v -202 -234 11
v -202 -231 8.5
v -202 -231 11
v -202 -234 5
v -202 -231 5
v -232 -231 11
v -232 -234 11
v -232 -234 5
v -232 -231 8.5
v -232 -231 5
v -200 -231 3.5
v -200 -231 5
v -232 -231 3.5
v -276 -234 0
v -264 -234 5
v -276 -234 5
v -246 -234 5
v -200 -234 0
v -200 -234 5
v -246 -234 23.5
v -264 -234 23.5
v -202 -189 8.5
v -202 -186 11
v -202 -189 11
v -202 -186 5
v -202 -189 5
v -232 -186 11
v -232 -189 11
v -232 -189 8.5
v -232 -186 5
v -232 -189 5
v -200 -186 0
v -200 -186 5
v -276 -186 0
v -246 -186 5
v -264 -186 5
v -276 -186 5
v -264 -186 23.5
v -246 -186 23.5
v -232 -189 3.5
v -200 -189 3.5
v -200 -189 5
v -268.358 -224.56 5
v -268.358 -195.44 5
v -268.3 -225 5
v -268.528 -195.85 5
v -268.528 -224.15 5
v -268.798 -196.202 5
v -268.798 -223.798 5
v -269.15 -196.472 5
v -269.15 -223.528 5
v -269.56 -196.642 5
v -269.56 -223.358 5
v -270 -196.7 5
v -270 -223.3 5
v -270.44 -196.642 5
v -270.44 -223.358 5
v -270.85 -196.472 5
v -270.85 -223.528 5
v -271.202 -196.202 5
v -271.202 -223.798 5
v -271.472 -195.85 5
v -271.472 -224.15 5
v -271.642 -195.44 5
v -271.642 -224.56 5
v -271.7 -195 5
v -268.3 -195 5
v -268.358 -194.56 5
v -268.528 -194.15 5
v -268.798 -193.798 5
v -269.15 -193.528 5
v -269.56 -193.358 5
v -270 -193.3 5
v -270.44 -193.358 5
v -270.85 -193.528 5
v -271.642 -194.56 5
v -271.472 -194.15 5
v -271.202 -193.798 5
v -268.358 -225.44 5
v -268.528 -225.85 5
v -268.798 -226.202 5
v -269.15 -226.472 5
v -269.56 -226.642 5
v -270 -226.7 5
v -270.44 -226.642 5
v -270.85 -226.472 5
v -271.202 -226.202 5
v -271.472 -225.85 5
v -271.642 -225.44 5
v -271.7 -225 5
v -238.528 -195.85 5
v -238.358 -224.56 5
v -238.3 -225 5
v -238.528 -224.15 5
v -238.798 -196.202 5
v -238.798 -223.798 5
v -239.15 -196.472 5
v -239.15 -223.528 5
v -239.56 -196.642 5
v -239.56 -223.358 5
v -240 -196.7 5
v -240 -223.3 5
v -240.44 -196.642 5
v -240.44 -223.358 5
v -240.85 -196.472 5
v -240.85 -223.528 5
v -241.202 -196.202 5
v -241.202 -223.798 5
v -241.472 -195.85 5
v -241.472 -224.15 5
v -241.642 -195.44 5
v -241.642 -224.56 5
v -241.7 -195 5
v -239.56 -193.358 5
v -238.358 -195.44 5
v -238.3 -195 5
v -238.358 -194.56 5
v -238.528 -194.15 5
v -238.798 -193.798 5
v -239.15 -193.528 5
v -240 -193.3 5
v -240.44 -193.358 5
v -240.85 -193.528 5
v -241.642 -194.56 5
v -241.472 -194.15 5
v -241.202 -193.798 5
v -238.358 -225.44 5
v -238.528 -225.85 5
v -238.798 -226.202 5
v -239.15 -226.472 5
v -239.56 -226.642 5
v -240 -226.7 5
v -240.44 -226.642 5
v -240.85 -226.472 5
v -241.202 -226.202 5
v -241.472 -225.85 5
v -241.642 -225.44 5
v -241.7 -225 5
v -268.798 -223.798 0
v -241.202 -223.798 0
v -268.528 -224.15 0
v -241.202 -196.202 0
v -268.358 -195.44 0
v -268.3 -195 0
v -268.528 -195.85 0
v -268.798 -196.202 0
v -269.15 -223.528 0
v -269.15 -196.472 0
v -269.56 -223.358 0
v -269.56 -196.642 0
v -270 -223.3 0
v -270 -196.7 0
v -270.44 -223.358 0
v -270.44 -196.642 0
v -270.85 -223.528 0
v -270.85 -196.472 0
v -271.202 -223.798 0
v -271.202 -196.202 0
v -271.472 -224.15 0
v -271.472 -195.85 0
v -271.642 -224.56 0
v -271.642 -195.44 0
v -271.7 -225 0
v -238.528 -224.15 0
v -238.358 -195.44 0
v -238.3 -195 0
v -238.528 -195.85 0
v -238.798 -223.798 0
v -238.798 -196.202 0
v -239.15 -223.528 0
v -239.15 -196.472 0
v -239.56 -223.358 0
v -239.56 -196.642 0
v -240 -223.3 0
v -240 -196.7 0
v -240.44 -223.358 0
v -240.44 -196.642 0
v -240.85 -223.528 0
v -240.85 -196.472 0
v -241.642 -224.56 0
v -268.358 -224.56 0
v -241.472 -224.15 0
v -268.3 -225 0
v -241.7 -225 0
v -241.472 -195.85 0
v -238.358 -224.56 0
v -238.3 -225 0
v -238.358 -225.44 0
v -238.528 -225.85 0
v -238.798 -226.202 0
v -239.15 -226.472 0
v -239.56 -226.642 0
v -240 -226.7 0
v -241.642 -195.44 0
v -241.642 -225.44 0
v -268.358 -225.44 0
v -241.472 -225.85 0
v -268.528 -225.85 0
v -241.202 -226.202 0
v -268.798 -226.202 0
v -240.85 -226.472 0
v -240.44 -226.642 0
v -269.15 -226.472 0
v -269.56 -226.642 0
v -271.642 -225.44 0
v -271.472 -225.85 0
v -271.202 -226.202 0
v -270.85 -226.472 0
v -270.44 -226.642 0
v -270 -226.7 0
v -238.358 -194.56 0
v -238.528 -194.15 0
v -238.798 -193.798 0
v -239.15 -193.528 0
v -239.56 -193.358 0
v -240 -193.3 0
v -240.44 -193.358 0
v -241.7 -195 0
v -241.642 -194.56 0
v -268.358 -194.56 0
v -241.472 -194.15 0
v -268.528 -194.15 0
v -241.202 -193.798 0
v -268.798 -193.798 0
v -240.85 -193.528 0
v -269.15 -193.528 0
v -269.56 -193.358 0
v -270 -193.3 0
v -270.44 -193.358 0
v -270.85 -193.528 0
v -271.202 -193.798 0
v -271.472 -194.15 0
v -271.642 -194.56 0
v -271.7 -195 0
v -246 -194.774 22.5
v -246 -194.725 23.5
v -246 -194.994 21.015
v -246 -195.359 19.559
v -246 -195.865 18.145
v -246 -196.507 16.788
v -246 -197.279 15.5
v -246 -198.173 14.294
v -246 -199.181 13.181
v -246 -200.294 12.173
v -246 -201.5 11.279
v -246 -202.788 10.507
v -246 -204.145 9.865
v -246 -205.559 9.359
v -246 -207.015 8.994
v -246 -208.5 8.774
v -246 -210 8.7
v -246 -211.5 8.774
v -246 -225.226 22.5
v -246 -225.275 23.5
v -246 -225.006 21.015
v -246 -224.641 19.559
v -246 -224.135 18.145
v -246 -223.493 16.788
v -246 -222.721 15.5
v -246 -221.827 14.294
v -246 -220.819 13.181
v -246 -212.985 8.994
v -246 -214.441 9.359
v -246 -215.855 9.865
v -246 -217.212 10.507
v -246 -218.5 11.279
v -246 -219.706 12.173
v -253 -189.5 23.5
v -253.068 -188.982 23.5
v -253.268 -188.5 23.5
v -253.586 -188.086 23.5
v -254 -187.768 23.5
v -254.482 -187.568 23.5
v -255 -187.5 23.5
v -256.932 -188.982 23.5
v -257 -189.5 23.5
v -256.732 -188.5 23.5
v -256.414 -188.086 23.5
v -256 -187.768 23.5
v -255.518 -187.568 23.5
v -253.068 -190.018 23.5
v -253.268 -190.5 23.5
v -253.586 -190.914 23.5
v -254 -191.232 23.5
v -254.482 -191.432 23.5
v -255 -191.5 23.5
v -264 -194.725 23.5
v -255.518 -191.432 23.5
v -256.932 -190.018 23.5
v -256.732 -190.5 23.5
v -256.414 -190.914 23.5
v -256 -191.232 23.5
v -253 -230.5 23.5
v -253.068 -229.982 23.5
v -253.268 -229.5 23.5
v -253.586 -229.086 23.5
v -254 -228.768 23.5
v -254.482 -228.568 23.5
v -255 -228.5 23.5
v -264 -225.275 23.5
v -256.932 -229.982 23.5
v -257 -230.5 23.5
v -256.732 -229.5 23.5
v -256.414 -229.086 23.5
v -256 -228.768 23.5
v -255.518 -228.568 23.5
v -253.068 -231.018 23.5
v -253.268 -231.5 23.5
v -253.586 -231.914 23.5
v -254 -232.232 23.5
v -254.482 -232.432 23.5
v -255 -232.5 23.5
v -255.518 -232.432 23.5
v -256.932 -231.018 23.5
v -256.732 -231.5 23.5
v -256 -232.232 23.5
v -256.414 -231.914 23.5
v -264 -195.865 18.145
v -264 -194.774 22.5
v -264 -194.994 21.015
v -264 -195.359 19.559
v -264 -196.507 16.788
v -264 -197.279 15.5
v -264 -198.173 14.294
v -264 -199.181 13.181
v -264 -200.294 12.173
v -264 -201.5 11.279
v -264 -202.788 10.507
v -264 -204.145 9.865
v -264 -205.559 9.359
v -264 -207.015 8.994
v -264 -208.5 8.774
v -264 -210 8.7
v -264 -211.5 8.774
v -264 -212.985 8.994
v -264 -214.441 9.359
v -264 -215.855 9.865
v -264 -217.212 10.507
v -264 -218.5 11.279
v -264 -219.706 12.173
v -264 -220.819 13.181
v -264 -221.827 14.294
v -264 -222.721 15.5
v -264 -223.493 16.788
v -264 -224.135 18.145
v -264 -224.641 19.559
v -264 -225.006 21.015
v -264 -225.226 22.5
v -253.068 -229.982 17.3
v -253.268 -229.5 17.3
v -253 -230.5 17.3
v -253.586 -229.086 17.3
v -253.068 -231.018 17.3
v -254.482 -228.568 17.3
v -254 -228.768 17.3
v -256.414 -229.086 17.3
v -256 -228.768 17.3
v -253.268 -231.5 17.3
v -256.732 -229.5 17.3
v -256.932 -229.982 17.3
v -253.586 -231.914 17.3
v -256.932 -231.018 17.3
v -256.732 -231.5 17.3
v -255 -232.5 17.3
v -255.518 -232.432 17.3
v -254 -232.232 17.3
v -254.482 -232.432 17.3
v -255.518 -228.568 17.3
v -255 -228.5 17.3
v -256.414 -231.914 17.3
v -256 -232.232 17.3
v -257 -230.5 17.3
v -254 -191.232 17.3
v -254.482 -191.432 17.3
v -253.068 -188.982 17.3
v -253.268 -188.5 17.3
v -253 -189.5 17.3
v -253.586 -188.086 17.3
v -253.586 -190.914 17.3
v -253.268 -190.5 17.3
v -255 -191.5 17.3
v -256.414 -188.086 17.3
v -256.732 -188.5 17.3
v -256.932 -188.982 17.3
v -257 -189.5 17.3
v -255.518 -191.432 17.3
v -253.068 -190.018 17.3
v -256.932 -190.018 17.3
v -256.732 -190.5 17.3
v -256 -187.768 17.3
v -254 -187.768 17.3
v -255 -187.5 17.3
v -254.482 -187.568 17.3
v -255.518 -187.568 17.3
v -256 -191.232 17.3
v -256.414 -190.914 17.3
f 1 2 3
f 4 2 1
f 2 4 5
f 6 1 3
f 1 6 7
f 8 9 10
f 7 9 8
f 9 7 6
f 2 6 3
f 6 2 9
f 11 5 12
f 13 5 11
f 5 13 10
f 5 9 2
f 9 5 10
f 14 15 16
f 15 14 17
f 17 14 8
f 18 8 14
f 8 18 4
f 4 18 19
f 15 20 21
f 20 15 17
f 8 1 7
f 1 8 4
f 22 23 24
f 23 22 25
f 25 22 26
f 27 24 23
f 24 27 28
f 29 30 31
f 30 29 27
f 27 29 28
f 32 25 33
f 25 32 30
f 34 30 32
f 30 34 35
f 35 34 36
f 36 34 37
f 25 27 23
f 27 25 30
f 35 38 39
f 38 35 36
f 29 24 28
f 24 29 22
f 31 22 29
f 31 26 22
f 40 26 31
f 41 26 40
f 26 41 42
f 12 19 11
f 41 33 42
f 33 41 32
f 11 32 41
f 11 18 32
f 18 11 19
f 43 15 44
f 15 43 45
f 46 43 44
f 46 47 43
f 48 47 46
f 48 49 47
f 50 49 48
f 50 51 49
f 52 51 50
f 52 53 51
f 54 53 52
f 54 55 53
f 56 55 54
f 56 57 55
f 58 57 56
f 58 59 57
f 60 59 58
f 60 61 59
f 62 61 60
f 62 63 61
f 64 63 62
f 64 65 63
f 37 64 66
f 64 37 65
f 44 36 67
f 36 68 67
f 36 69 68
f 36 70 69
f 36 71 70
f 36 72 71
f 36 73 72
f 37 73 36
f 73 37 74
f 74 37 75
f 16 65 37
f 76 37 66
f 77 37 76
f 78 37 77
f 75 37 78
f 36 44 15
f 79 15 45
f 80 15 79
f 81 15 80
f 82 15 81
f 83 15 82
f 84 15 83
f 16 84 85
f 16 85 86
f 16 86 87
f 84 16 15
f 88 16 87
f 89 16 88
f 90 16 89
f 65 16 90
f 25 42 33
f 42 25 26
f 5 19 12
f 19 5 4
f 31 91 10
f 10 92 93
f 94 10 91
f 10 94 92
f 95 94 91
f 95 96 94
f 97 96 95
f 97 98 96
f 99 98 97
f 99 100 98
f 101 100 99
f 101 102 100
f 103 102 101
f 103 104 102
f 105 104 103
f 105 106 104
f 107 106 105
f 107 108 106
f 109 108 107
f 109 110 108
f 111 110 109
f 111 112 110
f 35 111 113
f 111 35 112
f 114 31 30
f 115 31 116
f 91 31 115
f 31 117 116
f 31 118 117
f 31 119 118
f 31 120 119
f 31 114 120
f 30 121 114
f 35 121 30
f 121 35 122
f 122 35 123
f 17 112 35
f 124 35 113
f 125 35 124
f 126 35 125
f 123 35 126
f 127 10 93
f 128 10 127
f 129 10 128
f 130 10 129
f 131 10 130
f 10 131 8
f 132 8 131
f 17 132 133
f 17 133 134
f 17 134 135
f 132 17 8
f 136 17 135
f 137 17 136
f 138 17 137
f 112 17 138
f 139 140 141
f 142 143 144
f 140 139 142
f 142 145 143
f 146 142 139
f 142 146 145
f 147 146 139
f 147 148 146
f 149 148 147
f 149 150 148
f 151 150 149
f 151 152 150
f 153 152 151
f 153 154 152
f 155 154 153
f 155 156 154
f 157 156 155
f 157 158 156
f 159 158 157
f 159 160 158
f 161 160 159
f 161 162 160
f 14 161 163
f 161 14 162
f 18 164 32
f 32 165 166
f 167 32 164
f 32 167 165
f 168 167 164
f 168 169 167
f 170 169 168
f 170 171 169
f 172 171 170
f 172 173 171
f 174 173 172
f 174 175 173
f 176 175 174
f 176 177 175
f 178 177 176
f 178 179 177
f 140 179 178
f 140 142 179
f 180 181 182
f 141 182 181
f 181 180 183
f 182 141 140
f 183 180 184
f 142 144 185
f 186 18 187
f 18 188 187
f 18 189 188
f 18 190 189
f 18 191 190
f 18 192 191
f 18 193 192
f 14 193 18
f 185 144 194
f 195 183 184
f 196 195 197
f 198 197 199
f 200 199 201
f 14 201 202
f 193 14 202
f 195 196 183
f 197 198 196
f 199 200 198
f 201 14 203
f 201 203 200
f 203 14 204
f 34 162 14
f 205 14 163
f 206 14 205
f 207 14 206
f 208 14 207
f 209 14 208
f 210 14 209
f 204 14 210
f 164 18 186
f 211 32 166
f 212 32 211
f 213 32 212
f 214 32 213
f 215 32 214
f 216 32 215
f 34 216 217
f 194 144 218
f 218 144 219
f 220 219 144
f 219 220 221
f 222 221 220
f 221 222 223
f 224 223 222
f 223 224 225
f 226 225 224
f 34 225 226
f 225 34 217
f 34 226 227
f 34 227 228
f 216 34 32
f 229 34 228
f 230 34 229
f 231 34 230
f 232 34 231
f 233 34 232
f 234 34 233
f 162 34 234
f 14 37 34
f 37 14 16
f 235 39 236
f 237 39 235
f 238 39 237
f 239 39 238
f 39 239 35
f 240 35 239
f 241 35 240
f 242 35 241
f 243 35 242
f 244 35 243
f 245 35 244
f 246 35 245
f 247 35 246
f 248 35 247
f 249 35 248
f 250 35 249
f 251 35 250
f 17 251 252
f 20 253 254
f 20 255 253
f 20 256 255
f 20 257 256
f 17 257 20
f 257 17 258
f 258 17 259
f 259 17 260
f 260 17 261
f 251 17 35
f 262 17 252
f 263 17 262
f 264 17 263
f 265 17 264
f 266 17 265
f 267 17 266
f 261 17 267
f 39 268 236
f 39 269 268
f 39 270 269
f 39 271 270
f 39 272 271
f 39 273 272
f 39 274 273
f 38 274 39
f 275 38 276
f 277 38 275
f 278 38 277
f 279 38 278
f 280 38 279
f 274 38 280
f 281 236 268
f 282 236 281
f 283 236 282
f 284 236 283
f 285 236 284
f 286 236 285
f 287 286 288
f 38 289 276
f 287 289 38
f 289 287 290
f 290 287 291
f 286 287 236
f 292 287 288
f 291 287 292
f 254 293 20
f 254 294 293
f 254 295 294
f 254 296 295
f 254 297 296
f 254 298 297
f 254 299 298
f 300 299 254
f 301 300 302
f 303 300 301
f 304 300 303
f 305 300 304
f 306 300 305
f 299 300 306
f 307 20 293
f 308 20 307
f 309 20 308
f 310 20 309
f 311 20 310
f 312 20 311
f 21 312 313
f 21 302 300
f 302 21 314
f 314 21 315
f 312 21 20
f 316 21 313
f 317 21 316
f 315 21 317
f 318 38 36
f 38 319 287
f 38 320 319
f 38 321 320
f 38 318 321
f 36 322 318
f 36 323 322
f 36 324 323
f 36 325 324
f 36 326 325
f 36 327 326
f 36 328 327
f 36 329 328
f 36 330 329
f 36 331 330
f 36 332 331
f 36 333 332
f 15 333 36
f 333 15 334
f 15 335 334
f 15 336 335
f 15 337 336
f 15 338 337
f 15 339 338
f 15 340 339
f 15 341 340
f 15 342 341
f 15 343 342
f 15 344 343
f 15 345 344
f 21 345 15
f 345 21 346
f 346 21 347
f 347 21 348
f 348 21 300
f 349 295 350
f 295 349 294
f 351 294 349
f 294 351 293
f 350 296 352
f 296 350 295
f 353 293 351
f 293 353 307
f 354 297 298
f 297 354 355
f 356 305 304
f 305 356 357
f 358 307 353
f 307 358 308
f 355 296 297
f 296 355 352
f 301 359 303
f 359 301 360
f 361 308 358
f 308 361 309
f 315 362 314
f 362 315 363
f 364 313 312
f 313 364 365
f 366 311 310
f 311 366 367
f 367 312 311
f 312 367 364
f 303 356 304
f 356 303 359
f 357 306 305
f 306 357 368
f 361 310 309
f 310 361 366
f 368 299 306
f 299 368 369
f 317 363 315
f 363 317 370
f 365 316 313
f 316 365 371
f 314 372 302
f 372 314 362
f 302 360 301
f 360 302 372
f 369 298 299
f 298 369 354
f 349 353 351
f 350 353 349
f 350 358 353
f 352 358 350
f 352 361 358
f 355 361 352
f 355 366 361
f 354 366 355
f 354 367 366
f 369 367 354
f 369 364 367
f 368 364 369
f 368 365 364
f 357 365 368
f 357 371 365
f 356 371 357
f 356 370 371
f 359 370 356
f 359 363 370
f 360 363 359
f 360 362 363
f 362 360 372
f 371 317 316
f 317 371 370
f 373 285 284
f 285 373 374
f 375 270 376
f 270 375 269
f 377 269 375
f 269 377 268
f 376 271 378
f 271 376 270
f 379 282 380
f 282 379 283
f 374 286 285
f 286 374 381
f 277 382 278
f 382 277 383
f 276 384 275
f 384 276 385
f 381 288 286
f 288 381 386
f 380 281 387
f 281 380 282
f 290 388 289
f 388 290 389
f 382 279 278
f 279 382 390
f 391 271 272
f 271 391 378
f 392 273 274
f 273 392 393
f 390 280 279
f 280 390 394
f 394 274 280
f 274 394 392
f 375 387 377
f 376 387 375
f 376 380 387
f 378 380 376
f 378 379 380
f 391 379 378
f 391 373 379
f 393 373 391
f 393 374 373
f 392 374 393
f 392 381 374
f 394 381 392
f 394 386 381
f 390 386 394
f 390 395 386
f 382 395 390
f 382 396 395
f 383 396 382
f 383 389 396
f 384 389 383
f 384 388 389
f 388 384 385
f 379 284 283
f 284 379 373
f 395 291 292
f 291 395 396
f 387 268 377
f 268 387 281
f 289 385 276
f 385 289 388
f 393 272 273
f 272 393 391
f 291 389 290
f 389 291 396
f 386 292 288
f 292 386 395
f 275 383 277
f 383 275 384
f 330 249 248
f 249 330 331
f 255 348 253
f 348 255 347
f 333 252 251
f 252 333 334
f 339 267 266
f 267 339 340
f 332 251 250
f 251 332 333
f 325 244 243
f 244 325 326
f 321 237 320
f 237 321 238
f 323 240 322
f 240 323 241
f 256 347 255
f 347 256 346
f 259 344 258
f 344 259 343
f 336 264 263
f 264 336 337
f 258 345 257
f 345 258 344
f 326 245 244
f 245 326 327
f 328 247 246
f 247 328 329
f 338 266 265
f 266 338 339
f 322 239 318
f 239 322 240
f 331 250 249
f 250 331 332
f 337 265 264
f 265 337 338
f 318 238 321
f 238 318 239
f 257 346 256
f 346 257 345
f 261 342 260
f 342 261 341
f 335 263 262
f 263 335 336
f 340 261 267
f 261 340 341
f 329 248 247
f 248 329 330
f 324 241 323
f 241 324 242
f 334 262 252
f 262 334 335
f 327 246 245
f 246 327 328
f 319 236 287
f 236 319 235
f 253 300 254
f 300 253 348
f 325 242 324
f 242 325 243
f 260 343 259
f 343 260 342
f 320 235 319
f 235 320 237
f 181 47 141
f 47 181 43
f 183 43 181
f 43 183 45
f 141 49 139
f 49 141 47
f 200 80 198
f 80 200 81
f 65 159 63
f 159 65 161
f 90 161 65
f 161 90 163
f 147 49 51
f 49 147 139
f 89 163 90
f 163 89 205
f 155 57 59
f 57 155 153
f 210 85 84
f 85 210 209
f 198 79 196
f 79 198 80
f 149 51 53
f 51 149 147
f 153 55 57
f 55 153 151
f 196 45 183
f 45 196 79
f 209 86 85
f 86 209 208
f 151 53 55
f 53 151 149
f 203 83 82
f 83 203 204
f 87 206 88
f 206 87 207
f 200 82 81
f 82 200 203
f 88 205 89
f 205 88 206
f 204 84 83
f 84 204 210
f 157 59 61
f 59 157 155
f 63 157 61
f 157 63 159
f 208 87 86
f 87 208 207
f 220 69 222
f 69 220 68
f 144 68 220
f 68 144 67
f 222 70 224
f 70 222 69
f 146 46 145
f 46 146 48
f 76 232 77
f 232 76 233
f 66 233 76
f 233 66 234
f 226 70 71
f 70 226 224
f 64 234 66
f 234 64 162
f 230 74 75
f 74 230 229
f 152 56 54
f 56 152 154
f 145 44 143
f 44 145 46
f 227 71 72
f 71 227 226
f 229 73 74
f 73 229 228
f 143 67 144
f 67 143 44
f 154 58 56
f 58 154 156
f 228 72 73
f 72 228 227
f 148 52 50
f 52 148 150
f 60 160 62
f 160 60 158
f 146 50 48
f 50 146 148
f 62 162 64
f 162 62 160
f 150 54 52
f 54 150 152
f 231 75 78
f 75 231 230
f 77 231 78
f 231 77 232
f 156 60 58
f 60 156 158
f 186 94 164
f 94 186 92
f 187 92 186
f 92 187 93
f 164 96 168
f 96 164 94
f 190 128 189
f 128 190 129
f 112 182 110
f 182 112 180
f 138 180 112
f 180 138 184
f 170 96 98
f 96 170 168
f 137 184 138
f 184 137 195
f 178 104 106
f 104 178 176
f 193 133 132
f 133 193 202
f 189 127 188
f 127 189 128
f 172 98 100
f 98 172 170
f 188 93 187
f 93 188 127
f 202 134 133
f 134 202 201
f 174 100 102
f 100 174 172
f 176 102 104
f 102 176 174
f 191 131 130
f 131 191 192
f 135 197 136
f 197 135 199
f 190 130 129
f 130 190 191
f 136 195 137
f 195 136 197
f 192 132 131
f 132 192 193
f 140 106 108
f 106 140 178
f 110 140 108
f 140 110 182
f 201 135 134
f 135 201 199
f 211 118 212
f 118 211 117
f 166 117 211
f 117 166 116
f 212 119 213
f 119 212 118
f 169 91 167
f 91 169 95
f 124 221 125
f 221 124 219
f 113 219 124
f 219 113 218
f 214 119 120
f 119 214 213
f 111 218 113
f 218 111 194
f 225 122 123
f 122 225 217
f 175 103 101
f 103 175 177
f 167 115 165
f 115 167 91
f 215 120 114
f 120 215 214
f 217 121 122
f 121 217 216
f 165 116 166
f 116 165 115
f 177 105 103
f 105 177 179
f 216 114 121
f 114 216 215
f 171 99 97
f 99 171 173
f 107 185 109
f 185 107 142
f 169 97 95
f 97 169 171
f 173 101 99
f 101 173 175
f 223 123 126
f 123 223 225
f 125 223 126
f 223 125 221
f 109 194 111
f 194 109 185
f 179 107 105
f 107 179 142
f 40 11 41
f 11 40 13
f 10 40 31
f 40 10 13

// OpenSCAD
// file: machine_frame.scad
// =============================================
// Riftbound Card Sorter — shared machine frame
// =============================================
// Single source of truth for the card path after the Nov 11 redesign
// (suction pick from a motor-raised hopper, raised transport line,
// cradle shuttle sorter). Machine coords as in assembly.scad:
//   X = card travel (hopper -> belt -> tray), Y = across belt (+Y = back,
//   electronics side), Z = up, Z=0 bottom of baseplate tiles.
// `use <machine_frame.scad>` does not import variables, so read these via
// the functions at the bottom.
// =============================================

base_top   = 4;      // top of baseplate tiles
riser_h    = 60;     // conveyor deck raised so cards can FALL into both tray floors
deck_z     = base_top + riser_h;          // rail base / hopper deck reference = 64

// Conveyor (geometry unchanged, just lifted by riser_h)
belt_x0    = -165;   // belt start
belt_x1    = 85;     // belt end
roller_x   = [-140, 60];
rail_in    = 45;     // |Y| of rail inner faces
shaft_z    = deck_z + 15;
card_z     = deck_z + 15 + 11.9;          // top of round belts = card face = 90.9
scan_flat  = [-127, 47];                  // slide-bed backed flat zone (X)

// Scanner
cam_x      = 5;      // lens axis; card centred here for capture (moved from -40 so the hood clears the arm drop zone at X -139..-51)

// Hopper (motor-raised floor keeps top card at card_z)
hopper_x   = -215;   // cavity centre X (Y = 0)

// Baseplate extents (3x3 tiles of 190x180)
base_x     = [-285, 285];
base_y     = [-270, 270];

// Pick & place hand-off
drop_x     = -95;    // card CENTRE when the suction arm releases it onto the belt
                     // (card spans -139..-51: on belts, clear of hopper wall)
drop_clear = 3;      // card underside this far above belt at release (low drop)

// Sorting tray (bottom on baseplate); owner of tray placement may move it in X
tray_floor_lower_z = base_top + 2.5;      // lower slot floor
tray_floor_upper_z = base_top + 65 + 3 + 2.5;  // = 74.5 upper slot floor

// Card
card_w = 63; card_l = 88; card_t = 0.33;  // RAW cards (owner confirmed 2026-11-11: no sleeves), ~1.75 g

function frame_base_top()  = base_top;
function frame_riser_h()   = riser_h;
function frame_deck_z()    = deck_z;
function frame_belt_x0()   = belt_x0;
function frame_belt_x1()   = belt_x1;
function frame_roller_x()  = roller_x;
function frame_rail_in()   = rail_in;
function frame_card_z()    = card_z;
function frame_scan_flat() = scan_flat;
function frame_cam_x()     = cam_x;
function frame_hopper_x()  = hopper_x;
function frame_base_x()    = base_x;
function frame_base_y()    = base_y;
function frame_drop_x()    = drop_x;
function frame_drop_clear()= drop_clear;
function frame_tray_floor_lower_z() = tray_floor_lower_z;
function frame_tray_floor_upper_z() = tray_floor_upper_z;
// main file
// =============================================
// Riftbound Card Sorter — Vacuum pump bracket (R385 12 V diaphragm pump)
// =============================================
// Holds the R385 pump (vacuum source for the pick-arm cup) on the baseplate,
// front-left, with a TPU sleeve between the motor can and the printed clamp so
// the diaphragm buzz does not reach the baseplate / pick arm.
//
// PUMP (typical R385 / "385" aquarium diaphragm pump, e.g. Gikfun; measure yours):
//   motor RS-385 can Ø27.6 × 38 (rear boss + solder tabs ≈ 4 more),
//   pump head ≈ 40 wide × 36 tall × 32 long on the shaft end, two Ø8.5 nozzles
//   ≈ 15 long on the head end face. Overall ≈ 90 × 40 × 36.
//   Axis along machine X, head/nozzles toward +X (toward the arm tower,
//   where the 4 mm vacuum tube goes up the column).
//
// PLACEMENT (machine coords, bolts on 4 real baseplate grid holes):
//   axis Y −210, Z 28; can X −268..−230, head X −230..−198, nozzles to X ≈ −183.
//   Bracket X −276..−200, Y −234..−186, Z 4..47 (saddle + cap at X −264..−246,
//   head cradle at X −232..−200).
//   Grid holes (tile 0,0: X −270..−120, Y −255..−105 every 30): (−270, −225), (−270, −195),
//   (−240, −225), (−240, −195): 4 × M3 × 20 SHCS + washer + nut
//   (base 5 + tile 4 + 6 mm board = 15 clamp, + 4 → 19 → M3 × 20).
//   Clear of: arm-tower foot (X −188..−112, Y −173..−122: ≥ 13 mm in Y),
//   hopper (Y ≥ −65.6), riser (X ≥ −165), the arm sweep (all ≥ Y −152 and
//   Z ≥ 60 at this X) and the shuttle (X ≥ 92).
//
// ASSEMBLY ORDER — BASE BEFORE PUMP: the grid fixes the X −240 bolts at
//   Y −210 ± 15, and the can (r 13.8) leaves only 1.2 mm outside its outline: a
//   2.5 mm hex key (r 1.25) on those bolts is 0.05 mm inside the can's plan
//   outline, so they cannot be driven with the pump in place. Bolt the base
//   to the board first (all 4), then lay the pad, sleeve + pump and the cap.
//   To remove the base later, take the cap and pump off first.
//
// HEAD CRADLE: the head (≈ 32 long, ≈ 60 g with the diaphragm) used to
//   cantilever 50 mm from the 18 mm clamp. The base now runs on under the head
//   as a shallow cradle: a pocket (floor Z 7.5) holding a 1.5 mm TPU pad
//   (part="pad", or cut from the same neoprene strip) that the head bottom
//   (Z 9) rests on, and two 6 mm cheeks 1 mm off the head sides that stop it
//   rocking in Y. The pad keeps the head isolated like the can sleeve. Real
//   R385 heads vary: if the pad does not touch, shim it; it must not lift the
//   can off the saddle.
//
// VENT VALVE (part="valve_clip", a separate small bracket on 2 grid holes):
//   uxcell 2-way NORMALLY CLOSED mini air solenoid valve, DC 12 V 0.2 A (2.2 W),
//   0–350 mmHg, Ø3 mm barbs, 15 × 14 × 34 mm overall incl. the axial barb,
//   11 cm leads out of the coil end (listing: walmart.com/ip/809112545, the
//   common "0520-size" mini valve body). Measure yours: the
//   model below (coil 15 × 14 × 22, head Ø10 × 6, axial barb Ø3 × 6, side vent
//   barb Ø3 × 5) is a reference envelope, not a vendor drawing.
//   It lies along Y with the axial (line) barb toward +Y and the side barb up
//   (open to air = the vent). Clip on grid holes (−180, −255), (−150, −255):
//   2 × M3 × 20 SHCS + washer + nut (plate 5 + tile 4 + board 6 = 15, as the
//   base). The valve snaps down between two lipped walls onto a strip of 1 mm
//   foam tape (floor Z 19.5, valve axis Z 28 = the vacuum line height).
//   TEE: a 1/8" (3.2 mm) barbed plastic tee (≈ 22 × 11, Ø3 barbs) hangs in
//   the tube at X −165, Y −210, Z 28, 18 mm past the pump nozzle; its branch
//   (−Y) goes to the valve's axial barb with a 20 mm piece of 2 × 4 silicone
//   (PU 4 × 2.5 is a tight push onto a Ø3 barb: warm it). Valve clip X −186..−144,
//   Y −264..−246, Z 4..37.7; clear of the arm tower foot (Y ≥ −173: 73 mm), the
//   arm sweep (Y ≥ −152), the hopper (Y ≥ −65.6) and the pump base (X ≤ −200).
//
// ISOLATION: a TPU 95A sleeve (part="sleeve") on the can; the clamp halves
//   close a 1.0 mm gap onto it (≈ 0.5 mm radial squeeze of the 1.7 mm wall),
//   so the preload is set by geometry, not by screw torque. The sleeve's end
//   flanges keep it (and the pump) from walking axially. No TPU? Wrap the can
//   in 1.5 mm neoprene / EPDM strip, 18 mm wide, instead.
//
// PARTS (`part`, print orientation):
//   base        base flange + lower saddle + head cradle (2 × M3 inserts)  upright, no supports
//   cap         clamp strap                                    on its end face, no supports
//   sleeve      TPU isolation sleeve                           upright, no supports
//   pad         TPU head pad 30 × 40 × 1.5                     flat, no supports
//   valve_clip  vent-valve clip                                upright, no supports (lips 45°)
// HARDWARE: 4 × M3 × 20 SHCS + washer + nut (base → baseplate),
//   2 × M3 × 10 SHCS + 2 × M3 heat-set inserts (Ø4.0 × 5.7) (cap → base),
//   2 × M3 × 20 SHCS + washer + nut (valve clip → baseplate),
//   1 × 12 V NC mini solenoid valve, 1 × 1/8" barbed tee, 20 mm 2 × 4 silicone tube,
//   1 mm foam tape 14 × 16 (valve seat).
// =============================================

use <machine_frame.scad>

/* [Export] */
part = "base";        // base | cap | sleeve | assembly

$fn = 64;
bt = frame_base_top();                 // 4

// ── Pump ────────────────────────────────────────────────────────────────────
can_d   = 27.6;   can_l  = 38;
head_w  = 40;     head_h = 36;  head_l = 32;   head_dz = -1;   // head centre below the axis
noz_d   = 8.5;    noz_l  = 15;  noz_dy = 9;
pump_y  = -210;   pump_z = bt + 24;            // axis: Y −210, Z 28
can_x0  = -268;                                 // motor rear (can end)

// ── Sleeve / clamp ──────────────────────────────────────────────────────────
slv_id  = 27.2;  slv_t = 1.7;  slv_od = slv_id + 2 * slv_t;   // 30.6
slv_fl  = 2;     slv_fl_od = slv_od + 4;                       // end flanges
sad_w   = 18;                         // saddle / cap width along X
sad_x0  = -264;                       // saddle X −264..−246 (washers at −266.5 / −243.5 clear)
gap     = 1.0;                        // clamp gap (closes on the sleeve)
r_in    = slv_od / 2;                 // cradle radius 15.3
cap_r   = r_in + 2.5;                 // cap ring outer radius 17.8
ear_y   = 20.5;                       // cap screws / inserts at Y = axis ± 20.5
sad_hy  = 24;                         // saddle half-width (Y)
ear_t   = 5;                          // cap ear thickness
ins_d   = 4.0;  ins_l = 5.7;

// ── Base flange ─────────────────────────────────────────────────────────────
base_t  = 5;
base_x  = [-276, -200];  base_y = [-234, -186];
// ── Head cradle (under the pump head, X −230..−198) ─────────────────────────
pad_t   = 1.5;                        // TPU / neoprene pad
crd_x   = [-232, -200];               // cradle pocket + cheeks along X
crd_gap = 1.0;                        // cheek ↔ head side
crd_h   = 6;                          // cheek height above the flange top
head_z0 = pump_z + head_dz - head_h / 2;          // 9: head underside
// baseplate grid: 3 × 3 tiles of 190 × 180 from X −285, Y −270, holes every
// 30 mm starting 15 mm in from each tile edge (X restarts per tile column)
function on_grid1(v, x0, tile, n) =
    let(t = floor((v - x0) / tile), r = (v - x0) - t * tile - 15)
    t >= 0 && t < n && r >= -1e-6 && abs(r / 30 - round(r / 30)) < 1e-6 && r <= tile - 30 + 1e-6;
function on_grid(p) = on_grid1(p[0], -285, 190, 3) && on_grid1(p[1], -270, 180, 3);
holes   = [[-270, -225], [-270, -195], [-240, -225], [-240, -195]];
for (h = holes) assert(on_grid(h), str("pump bracket hole ", h, " off the baseplate grid"));
assert(pump_z + head_dz - head_h / 2 > bt + 2, "pump head too close to the baseplate");
assert(pump_z - r_in - (bt + base_t) >= 3, "too little material under the cradle");
for (h = holes) assert(h[0] + 3.5 <= sad_x0 || h[0] - 3.5 >= sad_x0 + sad_w, "washer hits the saddle");
for (h = holes) assert(h[0] + 3.5 <= crd_x[0], "washer hits the head cradle");
assert(head_z0 - pad_t > bt + 2, "head cradle floor too thin");
assert(head_w / 2 + crd_gap + 3 <= sad_hy, "cradle cheeks leave the base");

echo(str("PUMP BRACKET: axis Y ", pump_y, " Z ", pump_z, "; can X ", can_x0, "..", can_x0 + can_l,
         "; head to X ", can_x0 + can_l + head_l, "; nozzle tips X ", can_x0 + can_l + head_l + noz_l,
         "; grid holes ", holes));

// =========================================================================
module xcyl(r, x0, x1, fn = 64) translate([x0, 0, 0]) rotate([0, 90, 0]) cylinder(r = r, h = x1 - x0, $fn = fn);

// Everything below in a pump-local frame: Y/Z relative to the axis, X machine.
module at_axis() translate([0, pump_y, pump_z]) children();

module bracket_base() {
    difference() {
        union() {
            translate([base_x[0], base_y[0], bt]) cube([base_x[1] - base_x[0], base_y[1] - base_y[0], base_t]);
            at_axis() translate([sad_x0, -sad_hy, bt + base_t - pump_z - 0.01])
                cube([sad_w, 2 * sad_hy, pump_z - gap / 2 - (bt + base_t) + 0.01]);
            // head-cradle cheeks (1 mm off the head sides)
            for (s = [-1, 1]) translate([crd_x[0], pump_y + (s > 0 ? head_w / 2 + crd_gap : -head_w / 2 - crd_gap - 3), bt + base_t - 0.01])
                cube([crd_x[1] - crd_x[0] - 2, 3, crd_h + 0.01]);
        }
        // head-cradle pocket for the pad (floor = head underside − pad)
        translate([crd_x[0], pump_y - head_w / 2 - crd_gap, head_z0 - pad_t])
            cube([crd_x[1] - crd_x[0] + 1, head_w + 2 * crd_gap, base_t]);
        at_axis() {
            xcyl(r_in, sad_x0 - 1, sad_x0 + sad_w + 1);
            for (s = [-1, 1]) translate([sad_x0 + sad_w / 2, s * ear_y, -gap / 2 - ins_l - 0.5])
                cylinder(d = ins_d, h = ins_l + 1, $fn = 24);
        }
        for (h = holes) translate([h[0], h[1], bt - 0.1]) cylinder(d = 3.4, h = base_t + 0.2, $fn = 24);
    }
}

module bracket_cap() {
    at_axis() difference() {
        union() {
            intersection() {
                xcyl(cap_r, sad_x0, sad_x0 + sad_w);
                translate([sad_x0 - 1, -cap_r - 1, gap / 2]) cube([sad_w + 2, 2 * cap_r + 2, cap_r + 1]);
            }
            translate([sad_x0, -sad_hy, gap / 2]) cube([sad_w, 2 * sad_hy, ear_t]);
        }
        xcyl(r_in, sad_x0 - 1, sad_x0 + sad_w + 1);
        for (s = [-1, 1]) translate([sad_x0 + sad_w / 2, s * ear_y, 0])
            cylinder(d = 3.4, h = cap_r + 2, $fn = 24);
    }
}

module sleeve_local()   // along +Z, z = 0 at the −X flange outer face
    difference() {
        union() {
            cylinder(d = slv_fl_od, h = slv_fl);
            cylinder(d = slv_od, h = 2 * slv_fl + sad_w + 0.4);
            translate([0, 0, slv_fl + sad_w + 0.4]) cylinder(d1 = slv_od, d2 = slv_fl_od, h = slv_fl);
        }
        translate([0, 0, -1]) cylinder(d = slv_id, h = 2 * slv_fl + sad_w + 3);
    }
module bracket_sleeve()
    at_axis() translate([sad_x0 - 0.2 - slv_fl, 0, 0]) rotate([0, 90, 0]) sleeve_local();

// Pump reference solid (not printed)
module hw_pump() color("DimGray") at_axis() {
    xcyl(can_d / 2, can_x0, can_x0 + can_l);
    xcyl(5, can_x0 - 4, can_x0);                                     // rear boss + tabs
    translate([can_x0 + can_l, -head_w / 2, head_dz - head_h / 2]) cube([head_l, head_w, head_h]);
    for (s = [-1, 1]) translate([0, s * noz_dy, 0])
        xcyl(noz_d / 2, can_x0 + can_l + head_l - 0.01, can_x0 + can_l + head_l + noz_l, 32);
}

module head_pad_local() cube([crd_x[1] - crd_x[0] - 2, head_w, pad_t]);
module bracket_pad() translate([crd_x[0] + 1, pump_y - head_w / 2, head_z0 - pad_t]) head_pad_local();

// =========================================================================
// VENT VALVE + TEE (reference envelopes) and the valve clip
// =========================================================================
// valve-local frame: coil end (leads) at z 0, axis +z, side (vent) barb +x
vv_w = 15; vv_d = 14; vv_coil = 22;          // coil body 15 (x) × 14 (y) × 22
vv_head_d = 10; vv_head_l = 6;               // valve head
vv_barb_d = 3; vv_barb_l = 6;                // axial (line) barb → total 34
vv_side_l = 5; vv_side_z = vv_coil + 3;      // side (vent) barb
vv_len = vv_coil + vv_head_l + vv_barb_l;    // 34
// placement: axis along +Y at X −165, Z 28 (line height), coil end at Y −264
vv_x = -165; vv_z = pump_z; vv_y0 = -264;
tee_c = [-165, pump_y, pump_z];              // tee centre (run along X, branch −Y)
tee_run = 22; tee_br = 11; tee_d = 6;        // 1/8" barbed tee envelope
vfoam = 1.0;                                 // foam tape under the valve
vc_holes = [[-180, -255], [-150, -255]];
vc_x = [-186, -144]; vc_y = [-264, -246]; vc_t = 5;
vc_wall = 2; vc_clr = 0.2; vc_lip = 0.8; vc_lip_h = 2.0;
vc_floor = vv_z - vv_w / 2 - vfoam;          // 19.5
vc_top = vv_z + vv_w / 2 + vc_clr + vc_lip_h; // 37.7
for (h = vc_holes) assert(on_grid(h), str("valve clip hole ", h, " off the baseplate grid"));
for (h = vc_holes) assert(abs(h[0] - vv_x) - 3.5 >= vv_d / 2 + vc_clr + vc_wall + 1.5, "valve clip washer hits a wall");
assert(vv_y0 >= frame_base_y()[0] + 4, "valve leads leave the baseplate");
let(g = (tee_c[1] - tee_br) - (vv_y0 + vv_len))   // free tube between the two barb tips
    assert(g >= 5 && g <= 15, str("tee branch ↔ valve barb gap ", g, " (20 mm tube wants 5..15)"));

module valve_local() {
    translate([-vv_w / 2, -vv_d / 2, 0]) cube([vv_w, vv_d, vv_coil]);
    translate([0, 0, vv_coil - 0.01]) cylinder(d = vv_head_d, h = vv_head_l + 0.01, $fn = 32);
    translate([0, 0, vv_coil + vv_head_l - 0.01]) cylinder(d = vv_barb_d, h = vv_barb_l + 0.01, $fn = 24);
    translate([0, 0, vv_side_z]) rotate([0, 90, 0]) cylinder(d = vv_barb_d, h = vv_head_d / 2 + vv_side_l, $fn = 24);
}
// local z → +Y, local x → +Z, local y → −X
module hw_valve() color("RoyalBlue")
    translate([vv_x, vv_y0, vv_z]) rotate([0, 0, 90]) rotate([0, 90, 0]) rotate([0, 0, 180]) valve_local();
module hw_tee() color("WhiteSmoke") translate(tee_c) {
    rotate([0, 90, 0]) cylinder(d = tee_d, h = 10, center = true, $fn = 24);
    rotate([90, 0, 0]) cylinder(d = tee_d, h = 5, $fn = 24);
    for (s = [-1, 1]) translate([s * 5, 0, 0]) rotate([0, s * 90, 0]) cylinder(d1 = 3.6, d2 = 2.6, h = tee_run / 2 - 5, $fn = 24);
    translate([0, -5, 0]) rotate([90, 0, 0]) cylinder(d1 = 3.6, d2 = 2.6, h = tee_br - 5, $fn = 24);
}
function vent_tee_pos()     = tee_c;                                  // tee centre
function vent_tee_branch()  = [tee_c[0], tee_c[1] - tee_br, tee_c[2]];// branch barb tip
function vent_valve_port()  = [vv_x, vv_y0 + vv_len, vv_z];           // valve axial barb tip
function vent_valve_root()  = [vv_x, vv_y0 + vv_coil + vv_head_l, vv_z];
function vent_valve_leads() = [vv_x, vv_y0, vv_z];                    // coil end (11 cm leads)
function pump_rear()        = [can_x0 - 4, pump_y, pump_z];           // pump terminals end

module valve_clip() {
    ix = vv_d / 2 + vc_clr;                       // channel half-width (X)
    difference() {
        union() {
            translate([vc_x[0], vc_y[0], bt]) cube([vc_x[1] - vc_x[0], vc_y[1] - vc_y[0], vc_t]);
            translate([vv_x - ix - vc_wall, vc_y[0], bt + vc_t - 0.01])
                cube([2 * (ix + vc_wall), vc_y[1] - vc_y[0], vc_top - bt - vc_t + 0.01]);
        }
        // channel down to the floor (open on top and at both ends)
        translate([vv_x - ix, vc_y[0] - 1, vc_floor]) cube([2 * ix, vc_y[1] - vc_y[0] + 2, vc_top]);
        for (h = vc_holes) translate([h[0], h[1], bt - 0.1]) cylinder(d = 3.4, h = vc_t + 0.2, $fn = 24);
    }
    // snap lips: 45° underside + 45° lead-in on top (prints without supports)
    for (s = [-1, 1]) translate([vv_x + s * ix, vc_y[0], 0]) rotate([90, 0, 0]) mirror([0, 0, 1])
        linear_extrude(vc_y[1] - vc_y[0])
            polygon([[s * 0.3, vv_z + vv_w / 2 + vc_clr - 0.3], [-s * vc_lip, vv_z + vv_w / 2 + vc_clr + vc_lip],
                     [-s * vc_lip, vc_top - vc_lip], [s * 0.3, vc_top - 0.01]]);   // 0.3 into the wall
}

// Machine-coordinate placement for assembly.scad (replaces the asm_pump stand-in)
module asm_pump_bracket(show_pump = true) {
    color("SlateGray") { bracket_base(); bracket_cap(); valve_clip(); }
    color("Black") { bracket_sleeve(); bracket_pad(); }
    if (show_pump) hw_pump();
}
// vent valve + tee: drawn with the vacuum tube (they are part of the line)
module asm_vent_valve() { hw_valve(); hw_tee(); }
function pump_nozzle_tip() = [can_x0 + can_l + head_l + noz_l, pump_y, pump_z];   // vacuum tube start

// =========================================================================
if (part == "base")     translate([0, 0, -bt]) bracket_base();
if (part == "cap")      translate([0, 0, sad_x0 + sad_w]) rotate([0, 90, 0]) bracket_cap();   // end face down
if (part == "sleeve")   sleeve_local();
if (part == "pad")      head_pad_local();
if (part == "valve_clip") translate([0, 0, -bt]) valve_clip();
if (part == "assembly") { asm_pump_bracket(); asm_vent_valve(); }
